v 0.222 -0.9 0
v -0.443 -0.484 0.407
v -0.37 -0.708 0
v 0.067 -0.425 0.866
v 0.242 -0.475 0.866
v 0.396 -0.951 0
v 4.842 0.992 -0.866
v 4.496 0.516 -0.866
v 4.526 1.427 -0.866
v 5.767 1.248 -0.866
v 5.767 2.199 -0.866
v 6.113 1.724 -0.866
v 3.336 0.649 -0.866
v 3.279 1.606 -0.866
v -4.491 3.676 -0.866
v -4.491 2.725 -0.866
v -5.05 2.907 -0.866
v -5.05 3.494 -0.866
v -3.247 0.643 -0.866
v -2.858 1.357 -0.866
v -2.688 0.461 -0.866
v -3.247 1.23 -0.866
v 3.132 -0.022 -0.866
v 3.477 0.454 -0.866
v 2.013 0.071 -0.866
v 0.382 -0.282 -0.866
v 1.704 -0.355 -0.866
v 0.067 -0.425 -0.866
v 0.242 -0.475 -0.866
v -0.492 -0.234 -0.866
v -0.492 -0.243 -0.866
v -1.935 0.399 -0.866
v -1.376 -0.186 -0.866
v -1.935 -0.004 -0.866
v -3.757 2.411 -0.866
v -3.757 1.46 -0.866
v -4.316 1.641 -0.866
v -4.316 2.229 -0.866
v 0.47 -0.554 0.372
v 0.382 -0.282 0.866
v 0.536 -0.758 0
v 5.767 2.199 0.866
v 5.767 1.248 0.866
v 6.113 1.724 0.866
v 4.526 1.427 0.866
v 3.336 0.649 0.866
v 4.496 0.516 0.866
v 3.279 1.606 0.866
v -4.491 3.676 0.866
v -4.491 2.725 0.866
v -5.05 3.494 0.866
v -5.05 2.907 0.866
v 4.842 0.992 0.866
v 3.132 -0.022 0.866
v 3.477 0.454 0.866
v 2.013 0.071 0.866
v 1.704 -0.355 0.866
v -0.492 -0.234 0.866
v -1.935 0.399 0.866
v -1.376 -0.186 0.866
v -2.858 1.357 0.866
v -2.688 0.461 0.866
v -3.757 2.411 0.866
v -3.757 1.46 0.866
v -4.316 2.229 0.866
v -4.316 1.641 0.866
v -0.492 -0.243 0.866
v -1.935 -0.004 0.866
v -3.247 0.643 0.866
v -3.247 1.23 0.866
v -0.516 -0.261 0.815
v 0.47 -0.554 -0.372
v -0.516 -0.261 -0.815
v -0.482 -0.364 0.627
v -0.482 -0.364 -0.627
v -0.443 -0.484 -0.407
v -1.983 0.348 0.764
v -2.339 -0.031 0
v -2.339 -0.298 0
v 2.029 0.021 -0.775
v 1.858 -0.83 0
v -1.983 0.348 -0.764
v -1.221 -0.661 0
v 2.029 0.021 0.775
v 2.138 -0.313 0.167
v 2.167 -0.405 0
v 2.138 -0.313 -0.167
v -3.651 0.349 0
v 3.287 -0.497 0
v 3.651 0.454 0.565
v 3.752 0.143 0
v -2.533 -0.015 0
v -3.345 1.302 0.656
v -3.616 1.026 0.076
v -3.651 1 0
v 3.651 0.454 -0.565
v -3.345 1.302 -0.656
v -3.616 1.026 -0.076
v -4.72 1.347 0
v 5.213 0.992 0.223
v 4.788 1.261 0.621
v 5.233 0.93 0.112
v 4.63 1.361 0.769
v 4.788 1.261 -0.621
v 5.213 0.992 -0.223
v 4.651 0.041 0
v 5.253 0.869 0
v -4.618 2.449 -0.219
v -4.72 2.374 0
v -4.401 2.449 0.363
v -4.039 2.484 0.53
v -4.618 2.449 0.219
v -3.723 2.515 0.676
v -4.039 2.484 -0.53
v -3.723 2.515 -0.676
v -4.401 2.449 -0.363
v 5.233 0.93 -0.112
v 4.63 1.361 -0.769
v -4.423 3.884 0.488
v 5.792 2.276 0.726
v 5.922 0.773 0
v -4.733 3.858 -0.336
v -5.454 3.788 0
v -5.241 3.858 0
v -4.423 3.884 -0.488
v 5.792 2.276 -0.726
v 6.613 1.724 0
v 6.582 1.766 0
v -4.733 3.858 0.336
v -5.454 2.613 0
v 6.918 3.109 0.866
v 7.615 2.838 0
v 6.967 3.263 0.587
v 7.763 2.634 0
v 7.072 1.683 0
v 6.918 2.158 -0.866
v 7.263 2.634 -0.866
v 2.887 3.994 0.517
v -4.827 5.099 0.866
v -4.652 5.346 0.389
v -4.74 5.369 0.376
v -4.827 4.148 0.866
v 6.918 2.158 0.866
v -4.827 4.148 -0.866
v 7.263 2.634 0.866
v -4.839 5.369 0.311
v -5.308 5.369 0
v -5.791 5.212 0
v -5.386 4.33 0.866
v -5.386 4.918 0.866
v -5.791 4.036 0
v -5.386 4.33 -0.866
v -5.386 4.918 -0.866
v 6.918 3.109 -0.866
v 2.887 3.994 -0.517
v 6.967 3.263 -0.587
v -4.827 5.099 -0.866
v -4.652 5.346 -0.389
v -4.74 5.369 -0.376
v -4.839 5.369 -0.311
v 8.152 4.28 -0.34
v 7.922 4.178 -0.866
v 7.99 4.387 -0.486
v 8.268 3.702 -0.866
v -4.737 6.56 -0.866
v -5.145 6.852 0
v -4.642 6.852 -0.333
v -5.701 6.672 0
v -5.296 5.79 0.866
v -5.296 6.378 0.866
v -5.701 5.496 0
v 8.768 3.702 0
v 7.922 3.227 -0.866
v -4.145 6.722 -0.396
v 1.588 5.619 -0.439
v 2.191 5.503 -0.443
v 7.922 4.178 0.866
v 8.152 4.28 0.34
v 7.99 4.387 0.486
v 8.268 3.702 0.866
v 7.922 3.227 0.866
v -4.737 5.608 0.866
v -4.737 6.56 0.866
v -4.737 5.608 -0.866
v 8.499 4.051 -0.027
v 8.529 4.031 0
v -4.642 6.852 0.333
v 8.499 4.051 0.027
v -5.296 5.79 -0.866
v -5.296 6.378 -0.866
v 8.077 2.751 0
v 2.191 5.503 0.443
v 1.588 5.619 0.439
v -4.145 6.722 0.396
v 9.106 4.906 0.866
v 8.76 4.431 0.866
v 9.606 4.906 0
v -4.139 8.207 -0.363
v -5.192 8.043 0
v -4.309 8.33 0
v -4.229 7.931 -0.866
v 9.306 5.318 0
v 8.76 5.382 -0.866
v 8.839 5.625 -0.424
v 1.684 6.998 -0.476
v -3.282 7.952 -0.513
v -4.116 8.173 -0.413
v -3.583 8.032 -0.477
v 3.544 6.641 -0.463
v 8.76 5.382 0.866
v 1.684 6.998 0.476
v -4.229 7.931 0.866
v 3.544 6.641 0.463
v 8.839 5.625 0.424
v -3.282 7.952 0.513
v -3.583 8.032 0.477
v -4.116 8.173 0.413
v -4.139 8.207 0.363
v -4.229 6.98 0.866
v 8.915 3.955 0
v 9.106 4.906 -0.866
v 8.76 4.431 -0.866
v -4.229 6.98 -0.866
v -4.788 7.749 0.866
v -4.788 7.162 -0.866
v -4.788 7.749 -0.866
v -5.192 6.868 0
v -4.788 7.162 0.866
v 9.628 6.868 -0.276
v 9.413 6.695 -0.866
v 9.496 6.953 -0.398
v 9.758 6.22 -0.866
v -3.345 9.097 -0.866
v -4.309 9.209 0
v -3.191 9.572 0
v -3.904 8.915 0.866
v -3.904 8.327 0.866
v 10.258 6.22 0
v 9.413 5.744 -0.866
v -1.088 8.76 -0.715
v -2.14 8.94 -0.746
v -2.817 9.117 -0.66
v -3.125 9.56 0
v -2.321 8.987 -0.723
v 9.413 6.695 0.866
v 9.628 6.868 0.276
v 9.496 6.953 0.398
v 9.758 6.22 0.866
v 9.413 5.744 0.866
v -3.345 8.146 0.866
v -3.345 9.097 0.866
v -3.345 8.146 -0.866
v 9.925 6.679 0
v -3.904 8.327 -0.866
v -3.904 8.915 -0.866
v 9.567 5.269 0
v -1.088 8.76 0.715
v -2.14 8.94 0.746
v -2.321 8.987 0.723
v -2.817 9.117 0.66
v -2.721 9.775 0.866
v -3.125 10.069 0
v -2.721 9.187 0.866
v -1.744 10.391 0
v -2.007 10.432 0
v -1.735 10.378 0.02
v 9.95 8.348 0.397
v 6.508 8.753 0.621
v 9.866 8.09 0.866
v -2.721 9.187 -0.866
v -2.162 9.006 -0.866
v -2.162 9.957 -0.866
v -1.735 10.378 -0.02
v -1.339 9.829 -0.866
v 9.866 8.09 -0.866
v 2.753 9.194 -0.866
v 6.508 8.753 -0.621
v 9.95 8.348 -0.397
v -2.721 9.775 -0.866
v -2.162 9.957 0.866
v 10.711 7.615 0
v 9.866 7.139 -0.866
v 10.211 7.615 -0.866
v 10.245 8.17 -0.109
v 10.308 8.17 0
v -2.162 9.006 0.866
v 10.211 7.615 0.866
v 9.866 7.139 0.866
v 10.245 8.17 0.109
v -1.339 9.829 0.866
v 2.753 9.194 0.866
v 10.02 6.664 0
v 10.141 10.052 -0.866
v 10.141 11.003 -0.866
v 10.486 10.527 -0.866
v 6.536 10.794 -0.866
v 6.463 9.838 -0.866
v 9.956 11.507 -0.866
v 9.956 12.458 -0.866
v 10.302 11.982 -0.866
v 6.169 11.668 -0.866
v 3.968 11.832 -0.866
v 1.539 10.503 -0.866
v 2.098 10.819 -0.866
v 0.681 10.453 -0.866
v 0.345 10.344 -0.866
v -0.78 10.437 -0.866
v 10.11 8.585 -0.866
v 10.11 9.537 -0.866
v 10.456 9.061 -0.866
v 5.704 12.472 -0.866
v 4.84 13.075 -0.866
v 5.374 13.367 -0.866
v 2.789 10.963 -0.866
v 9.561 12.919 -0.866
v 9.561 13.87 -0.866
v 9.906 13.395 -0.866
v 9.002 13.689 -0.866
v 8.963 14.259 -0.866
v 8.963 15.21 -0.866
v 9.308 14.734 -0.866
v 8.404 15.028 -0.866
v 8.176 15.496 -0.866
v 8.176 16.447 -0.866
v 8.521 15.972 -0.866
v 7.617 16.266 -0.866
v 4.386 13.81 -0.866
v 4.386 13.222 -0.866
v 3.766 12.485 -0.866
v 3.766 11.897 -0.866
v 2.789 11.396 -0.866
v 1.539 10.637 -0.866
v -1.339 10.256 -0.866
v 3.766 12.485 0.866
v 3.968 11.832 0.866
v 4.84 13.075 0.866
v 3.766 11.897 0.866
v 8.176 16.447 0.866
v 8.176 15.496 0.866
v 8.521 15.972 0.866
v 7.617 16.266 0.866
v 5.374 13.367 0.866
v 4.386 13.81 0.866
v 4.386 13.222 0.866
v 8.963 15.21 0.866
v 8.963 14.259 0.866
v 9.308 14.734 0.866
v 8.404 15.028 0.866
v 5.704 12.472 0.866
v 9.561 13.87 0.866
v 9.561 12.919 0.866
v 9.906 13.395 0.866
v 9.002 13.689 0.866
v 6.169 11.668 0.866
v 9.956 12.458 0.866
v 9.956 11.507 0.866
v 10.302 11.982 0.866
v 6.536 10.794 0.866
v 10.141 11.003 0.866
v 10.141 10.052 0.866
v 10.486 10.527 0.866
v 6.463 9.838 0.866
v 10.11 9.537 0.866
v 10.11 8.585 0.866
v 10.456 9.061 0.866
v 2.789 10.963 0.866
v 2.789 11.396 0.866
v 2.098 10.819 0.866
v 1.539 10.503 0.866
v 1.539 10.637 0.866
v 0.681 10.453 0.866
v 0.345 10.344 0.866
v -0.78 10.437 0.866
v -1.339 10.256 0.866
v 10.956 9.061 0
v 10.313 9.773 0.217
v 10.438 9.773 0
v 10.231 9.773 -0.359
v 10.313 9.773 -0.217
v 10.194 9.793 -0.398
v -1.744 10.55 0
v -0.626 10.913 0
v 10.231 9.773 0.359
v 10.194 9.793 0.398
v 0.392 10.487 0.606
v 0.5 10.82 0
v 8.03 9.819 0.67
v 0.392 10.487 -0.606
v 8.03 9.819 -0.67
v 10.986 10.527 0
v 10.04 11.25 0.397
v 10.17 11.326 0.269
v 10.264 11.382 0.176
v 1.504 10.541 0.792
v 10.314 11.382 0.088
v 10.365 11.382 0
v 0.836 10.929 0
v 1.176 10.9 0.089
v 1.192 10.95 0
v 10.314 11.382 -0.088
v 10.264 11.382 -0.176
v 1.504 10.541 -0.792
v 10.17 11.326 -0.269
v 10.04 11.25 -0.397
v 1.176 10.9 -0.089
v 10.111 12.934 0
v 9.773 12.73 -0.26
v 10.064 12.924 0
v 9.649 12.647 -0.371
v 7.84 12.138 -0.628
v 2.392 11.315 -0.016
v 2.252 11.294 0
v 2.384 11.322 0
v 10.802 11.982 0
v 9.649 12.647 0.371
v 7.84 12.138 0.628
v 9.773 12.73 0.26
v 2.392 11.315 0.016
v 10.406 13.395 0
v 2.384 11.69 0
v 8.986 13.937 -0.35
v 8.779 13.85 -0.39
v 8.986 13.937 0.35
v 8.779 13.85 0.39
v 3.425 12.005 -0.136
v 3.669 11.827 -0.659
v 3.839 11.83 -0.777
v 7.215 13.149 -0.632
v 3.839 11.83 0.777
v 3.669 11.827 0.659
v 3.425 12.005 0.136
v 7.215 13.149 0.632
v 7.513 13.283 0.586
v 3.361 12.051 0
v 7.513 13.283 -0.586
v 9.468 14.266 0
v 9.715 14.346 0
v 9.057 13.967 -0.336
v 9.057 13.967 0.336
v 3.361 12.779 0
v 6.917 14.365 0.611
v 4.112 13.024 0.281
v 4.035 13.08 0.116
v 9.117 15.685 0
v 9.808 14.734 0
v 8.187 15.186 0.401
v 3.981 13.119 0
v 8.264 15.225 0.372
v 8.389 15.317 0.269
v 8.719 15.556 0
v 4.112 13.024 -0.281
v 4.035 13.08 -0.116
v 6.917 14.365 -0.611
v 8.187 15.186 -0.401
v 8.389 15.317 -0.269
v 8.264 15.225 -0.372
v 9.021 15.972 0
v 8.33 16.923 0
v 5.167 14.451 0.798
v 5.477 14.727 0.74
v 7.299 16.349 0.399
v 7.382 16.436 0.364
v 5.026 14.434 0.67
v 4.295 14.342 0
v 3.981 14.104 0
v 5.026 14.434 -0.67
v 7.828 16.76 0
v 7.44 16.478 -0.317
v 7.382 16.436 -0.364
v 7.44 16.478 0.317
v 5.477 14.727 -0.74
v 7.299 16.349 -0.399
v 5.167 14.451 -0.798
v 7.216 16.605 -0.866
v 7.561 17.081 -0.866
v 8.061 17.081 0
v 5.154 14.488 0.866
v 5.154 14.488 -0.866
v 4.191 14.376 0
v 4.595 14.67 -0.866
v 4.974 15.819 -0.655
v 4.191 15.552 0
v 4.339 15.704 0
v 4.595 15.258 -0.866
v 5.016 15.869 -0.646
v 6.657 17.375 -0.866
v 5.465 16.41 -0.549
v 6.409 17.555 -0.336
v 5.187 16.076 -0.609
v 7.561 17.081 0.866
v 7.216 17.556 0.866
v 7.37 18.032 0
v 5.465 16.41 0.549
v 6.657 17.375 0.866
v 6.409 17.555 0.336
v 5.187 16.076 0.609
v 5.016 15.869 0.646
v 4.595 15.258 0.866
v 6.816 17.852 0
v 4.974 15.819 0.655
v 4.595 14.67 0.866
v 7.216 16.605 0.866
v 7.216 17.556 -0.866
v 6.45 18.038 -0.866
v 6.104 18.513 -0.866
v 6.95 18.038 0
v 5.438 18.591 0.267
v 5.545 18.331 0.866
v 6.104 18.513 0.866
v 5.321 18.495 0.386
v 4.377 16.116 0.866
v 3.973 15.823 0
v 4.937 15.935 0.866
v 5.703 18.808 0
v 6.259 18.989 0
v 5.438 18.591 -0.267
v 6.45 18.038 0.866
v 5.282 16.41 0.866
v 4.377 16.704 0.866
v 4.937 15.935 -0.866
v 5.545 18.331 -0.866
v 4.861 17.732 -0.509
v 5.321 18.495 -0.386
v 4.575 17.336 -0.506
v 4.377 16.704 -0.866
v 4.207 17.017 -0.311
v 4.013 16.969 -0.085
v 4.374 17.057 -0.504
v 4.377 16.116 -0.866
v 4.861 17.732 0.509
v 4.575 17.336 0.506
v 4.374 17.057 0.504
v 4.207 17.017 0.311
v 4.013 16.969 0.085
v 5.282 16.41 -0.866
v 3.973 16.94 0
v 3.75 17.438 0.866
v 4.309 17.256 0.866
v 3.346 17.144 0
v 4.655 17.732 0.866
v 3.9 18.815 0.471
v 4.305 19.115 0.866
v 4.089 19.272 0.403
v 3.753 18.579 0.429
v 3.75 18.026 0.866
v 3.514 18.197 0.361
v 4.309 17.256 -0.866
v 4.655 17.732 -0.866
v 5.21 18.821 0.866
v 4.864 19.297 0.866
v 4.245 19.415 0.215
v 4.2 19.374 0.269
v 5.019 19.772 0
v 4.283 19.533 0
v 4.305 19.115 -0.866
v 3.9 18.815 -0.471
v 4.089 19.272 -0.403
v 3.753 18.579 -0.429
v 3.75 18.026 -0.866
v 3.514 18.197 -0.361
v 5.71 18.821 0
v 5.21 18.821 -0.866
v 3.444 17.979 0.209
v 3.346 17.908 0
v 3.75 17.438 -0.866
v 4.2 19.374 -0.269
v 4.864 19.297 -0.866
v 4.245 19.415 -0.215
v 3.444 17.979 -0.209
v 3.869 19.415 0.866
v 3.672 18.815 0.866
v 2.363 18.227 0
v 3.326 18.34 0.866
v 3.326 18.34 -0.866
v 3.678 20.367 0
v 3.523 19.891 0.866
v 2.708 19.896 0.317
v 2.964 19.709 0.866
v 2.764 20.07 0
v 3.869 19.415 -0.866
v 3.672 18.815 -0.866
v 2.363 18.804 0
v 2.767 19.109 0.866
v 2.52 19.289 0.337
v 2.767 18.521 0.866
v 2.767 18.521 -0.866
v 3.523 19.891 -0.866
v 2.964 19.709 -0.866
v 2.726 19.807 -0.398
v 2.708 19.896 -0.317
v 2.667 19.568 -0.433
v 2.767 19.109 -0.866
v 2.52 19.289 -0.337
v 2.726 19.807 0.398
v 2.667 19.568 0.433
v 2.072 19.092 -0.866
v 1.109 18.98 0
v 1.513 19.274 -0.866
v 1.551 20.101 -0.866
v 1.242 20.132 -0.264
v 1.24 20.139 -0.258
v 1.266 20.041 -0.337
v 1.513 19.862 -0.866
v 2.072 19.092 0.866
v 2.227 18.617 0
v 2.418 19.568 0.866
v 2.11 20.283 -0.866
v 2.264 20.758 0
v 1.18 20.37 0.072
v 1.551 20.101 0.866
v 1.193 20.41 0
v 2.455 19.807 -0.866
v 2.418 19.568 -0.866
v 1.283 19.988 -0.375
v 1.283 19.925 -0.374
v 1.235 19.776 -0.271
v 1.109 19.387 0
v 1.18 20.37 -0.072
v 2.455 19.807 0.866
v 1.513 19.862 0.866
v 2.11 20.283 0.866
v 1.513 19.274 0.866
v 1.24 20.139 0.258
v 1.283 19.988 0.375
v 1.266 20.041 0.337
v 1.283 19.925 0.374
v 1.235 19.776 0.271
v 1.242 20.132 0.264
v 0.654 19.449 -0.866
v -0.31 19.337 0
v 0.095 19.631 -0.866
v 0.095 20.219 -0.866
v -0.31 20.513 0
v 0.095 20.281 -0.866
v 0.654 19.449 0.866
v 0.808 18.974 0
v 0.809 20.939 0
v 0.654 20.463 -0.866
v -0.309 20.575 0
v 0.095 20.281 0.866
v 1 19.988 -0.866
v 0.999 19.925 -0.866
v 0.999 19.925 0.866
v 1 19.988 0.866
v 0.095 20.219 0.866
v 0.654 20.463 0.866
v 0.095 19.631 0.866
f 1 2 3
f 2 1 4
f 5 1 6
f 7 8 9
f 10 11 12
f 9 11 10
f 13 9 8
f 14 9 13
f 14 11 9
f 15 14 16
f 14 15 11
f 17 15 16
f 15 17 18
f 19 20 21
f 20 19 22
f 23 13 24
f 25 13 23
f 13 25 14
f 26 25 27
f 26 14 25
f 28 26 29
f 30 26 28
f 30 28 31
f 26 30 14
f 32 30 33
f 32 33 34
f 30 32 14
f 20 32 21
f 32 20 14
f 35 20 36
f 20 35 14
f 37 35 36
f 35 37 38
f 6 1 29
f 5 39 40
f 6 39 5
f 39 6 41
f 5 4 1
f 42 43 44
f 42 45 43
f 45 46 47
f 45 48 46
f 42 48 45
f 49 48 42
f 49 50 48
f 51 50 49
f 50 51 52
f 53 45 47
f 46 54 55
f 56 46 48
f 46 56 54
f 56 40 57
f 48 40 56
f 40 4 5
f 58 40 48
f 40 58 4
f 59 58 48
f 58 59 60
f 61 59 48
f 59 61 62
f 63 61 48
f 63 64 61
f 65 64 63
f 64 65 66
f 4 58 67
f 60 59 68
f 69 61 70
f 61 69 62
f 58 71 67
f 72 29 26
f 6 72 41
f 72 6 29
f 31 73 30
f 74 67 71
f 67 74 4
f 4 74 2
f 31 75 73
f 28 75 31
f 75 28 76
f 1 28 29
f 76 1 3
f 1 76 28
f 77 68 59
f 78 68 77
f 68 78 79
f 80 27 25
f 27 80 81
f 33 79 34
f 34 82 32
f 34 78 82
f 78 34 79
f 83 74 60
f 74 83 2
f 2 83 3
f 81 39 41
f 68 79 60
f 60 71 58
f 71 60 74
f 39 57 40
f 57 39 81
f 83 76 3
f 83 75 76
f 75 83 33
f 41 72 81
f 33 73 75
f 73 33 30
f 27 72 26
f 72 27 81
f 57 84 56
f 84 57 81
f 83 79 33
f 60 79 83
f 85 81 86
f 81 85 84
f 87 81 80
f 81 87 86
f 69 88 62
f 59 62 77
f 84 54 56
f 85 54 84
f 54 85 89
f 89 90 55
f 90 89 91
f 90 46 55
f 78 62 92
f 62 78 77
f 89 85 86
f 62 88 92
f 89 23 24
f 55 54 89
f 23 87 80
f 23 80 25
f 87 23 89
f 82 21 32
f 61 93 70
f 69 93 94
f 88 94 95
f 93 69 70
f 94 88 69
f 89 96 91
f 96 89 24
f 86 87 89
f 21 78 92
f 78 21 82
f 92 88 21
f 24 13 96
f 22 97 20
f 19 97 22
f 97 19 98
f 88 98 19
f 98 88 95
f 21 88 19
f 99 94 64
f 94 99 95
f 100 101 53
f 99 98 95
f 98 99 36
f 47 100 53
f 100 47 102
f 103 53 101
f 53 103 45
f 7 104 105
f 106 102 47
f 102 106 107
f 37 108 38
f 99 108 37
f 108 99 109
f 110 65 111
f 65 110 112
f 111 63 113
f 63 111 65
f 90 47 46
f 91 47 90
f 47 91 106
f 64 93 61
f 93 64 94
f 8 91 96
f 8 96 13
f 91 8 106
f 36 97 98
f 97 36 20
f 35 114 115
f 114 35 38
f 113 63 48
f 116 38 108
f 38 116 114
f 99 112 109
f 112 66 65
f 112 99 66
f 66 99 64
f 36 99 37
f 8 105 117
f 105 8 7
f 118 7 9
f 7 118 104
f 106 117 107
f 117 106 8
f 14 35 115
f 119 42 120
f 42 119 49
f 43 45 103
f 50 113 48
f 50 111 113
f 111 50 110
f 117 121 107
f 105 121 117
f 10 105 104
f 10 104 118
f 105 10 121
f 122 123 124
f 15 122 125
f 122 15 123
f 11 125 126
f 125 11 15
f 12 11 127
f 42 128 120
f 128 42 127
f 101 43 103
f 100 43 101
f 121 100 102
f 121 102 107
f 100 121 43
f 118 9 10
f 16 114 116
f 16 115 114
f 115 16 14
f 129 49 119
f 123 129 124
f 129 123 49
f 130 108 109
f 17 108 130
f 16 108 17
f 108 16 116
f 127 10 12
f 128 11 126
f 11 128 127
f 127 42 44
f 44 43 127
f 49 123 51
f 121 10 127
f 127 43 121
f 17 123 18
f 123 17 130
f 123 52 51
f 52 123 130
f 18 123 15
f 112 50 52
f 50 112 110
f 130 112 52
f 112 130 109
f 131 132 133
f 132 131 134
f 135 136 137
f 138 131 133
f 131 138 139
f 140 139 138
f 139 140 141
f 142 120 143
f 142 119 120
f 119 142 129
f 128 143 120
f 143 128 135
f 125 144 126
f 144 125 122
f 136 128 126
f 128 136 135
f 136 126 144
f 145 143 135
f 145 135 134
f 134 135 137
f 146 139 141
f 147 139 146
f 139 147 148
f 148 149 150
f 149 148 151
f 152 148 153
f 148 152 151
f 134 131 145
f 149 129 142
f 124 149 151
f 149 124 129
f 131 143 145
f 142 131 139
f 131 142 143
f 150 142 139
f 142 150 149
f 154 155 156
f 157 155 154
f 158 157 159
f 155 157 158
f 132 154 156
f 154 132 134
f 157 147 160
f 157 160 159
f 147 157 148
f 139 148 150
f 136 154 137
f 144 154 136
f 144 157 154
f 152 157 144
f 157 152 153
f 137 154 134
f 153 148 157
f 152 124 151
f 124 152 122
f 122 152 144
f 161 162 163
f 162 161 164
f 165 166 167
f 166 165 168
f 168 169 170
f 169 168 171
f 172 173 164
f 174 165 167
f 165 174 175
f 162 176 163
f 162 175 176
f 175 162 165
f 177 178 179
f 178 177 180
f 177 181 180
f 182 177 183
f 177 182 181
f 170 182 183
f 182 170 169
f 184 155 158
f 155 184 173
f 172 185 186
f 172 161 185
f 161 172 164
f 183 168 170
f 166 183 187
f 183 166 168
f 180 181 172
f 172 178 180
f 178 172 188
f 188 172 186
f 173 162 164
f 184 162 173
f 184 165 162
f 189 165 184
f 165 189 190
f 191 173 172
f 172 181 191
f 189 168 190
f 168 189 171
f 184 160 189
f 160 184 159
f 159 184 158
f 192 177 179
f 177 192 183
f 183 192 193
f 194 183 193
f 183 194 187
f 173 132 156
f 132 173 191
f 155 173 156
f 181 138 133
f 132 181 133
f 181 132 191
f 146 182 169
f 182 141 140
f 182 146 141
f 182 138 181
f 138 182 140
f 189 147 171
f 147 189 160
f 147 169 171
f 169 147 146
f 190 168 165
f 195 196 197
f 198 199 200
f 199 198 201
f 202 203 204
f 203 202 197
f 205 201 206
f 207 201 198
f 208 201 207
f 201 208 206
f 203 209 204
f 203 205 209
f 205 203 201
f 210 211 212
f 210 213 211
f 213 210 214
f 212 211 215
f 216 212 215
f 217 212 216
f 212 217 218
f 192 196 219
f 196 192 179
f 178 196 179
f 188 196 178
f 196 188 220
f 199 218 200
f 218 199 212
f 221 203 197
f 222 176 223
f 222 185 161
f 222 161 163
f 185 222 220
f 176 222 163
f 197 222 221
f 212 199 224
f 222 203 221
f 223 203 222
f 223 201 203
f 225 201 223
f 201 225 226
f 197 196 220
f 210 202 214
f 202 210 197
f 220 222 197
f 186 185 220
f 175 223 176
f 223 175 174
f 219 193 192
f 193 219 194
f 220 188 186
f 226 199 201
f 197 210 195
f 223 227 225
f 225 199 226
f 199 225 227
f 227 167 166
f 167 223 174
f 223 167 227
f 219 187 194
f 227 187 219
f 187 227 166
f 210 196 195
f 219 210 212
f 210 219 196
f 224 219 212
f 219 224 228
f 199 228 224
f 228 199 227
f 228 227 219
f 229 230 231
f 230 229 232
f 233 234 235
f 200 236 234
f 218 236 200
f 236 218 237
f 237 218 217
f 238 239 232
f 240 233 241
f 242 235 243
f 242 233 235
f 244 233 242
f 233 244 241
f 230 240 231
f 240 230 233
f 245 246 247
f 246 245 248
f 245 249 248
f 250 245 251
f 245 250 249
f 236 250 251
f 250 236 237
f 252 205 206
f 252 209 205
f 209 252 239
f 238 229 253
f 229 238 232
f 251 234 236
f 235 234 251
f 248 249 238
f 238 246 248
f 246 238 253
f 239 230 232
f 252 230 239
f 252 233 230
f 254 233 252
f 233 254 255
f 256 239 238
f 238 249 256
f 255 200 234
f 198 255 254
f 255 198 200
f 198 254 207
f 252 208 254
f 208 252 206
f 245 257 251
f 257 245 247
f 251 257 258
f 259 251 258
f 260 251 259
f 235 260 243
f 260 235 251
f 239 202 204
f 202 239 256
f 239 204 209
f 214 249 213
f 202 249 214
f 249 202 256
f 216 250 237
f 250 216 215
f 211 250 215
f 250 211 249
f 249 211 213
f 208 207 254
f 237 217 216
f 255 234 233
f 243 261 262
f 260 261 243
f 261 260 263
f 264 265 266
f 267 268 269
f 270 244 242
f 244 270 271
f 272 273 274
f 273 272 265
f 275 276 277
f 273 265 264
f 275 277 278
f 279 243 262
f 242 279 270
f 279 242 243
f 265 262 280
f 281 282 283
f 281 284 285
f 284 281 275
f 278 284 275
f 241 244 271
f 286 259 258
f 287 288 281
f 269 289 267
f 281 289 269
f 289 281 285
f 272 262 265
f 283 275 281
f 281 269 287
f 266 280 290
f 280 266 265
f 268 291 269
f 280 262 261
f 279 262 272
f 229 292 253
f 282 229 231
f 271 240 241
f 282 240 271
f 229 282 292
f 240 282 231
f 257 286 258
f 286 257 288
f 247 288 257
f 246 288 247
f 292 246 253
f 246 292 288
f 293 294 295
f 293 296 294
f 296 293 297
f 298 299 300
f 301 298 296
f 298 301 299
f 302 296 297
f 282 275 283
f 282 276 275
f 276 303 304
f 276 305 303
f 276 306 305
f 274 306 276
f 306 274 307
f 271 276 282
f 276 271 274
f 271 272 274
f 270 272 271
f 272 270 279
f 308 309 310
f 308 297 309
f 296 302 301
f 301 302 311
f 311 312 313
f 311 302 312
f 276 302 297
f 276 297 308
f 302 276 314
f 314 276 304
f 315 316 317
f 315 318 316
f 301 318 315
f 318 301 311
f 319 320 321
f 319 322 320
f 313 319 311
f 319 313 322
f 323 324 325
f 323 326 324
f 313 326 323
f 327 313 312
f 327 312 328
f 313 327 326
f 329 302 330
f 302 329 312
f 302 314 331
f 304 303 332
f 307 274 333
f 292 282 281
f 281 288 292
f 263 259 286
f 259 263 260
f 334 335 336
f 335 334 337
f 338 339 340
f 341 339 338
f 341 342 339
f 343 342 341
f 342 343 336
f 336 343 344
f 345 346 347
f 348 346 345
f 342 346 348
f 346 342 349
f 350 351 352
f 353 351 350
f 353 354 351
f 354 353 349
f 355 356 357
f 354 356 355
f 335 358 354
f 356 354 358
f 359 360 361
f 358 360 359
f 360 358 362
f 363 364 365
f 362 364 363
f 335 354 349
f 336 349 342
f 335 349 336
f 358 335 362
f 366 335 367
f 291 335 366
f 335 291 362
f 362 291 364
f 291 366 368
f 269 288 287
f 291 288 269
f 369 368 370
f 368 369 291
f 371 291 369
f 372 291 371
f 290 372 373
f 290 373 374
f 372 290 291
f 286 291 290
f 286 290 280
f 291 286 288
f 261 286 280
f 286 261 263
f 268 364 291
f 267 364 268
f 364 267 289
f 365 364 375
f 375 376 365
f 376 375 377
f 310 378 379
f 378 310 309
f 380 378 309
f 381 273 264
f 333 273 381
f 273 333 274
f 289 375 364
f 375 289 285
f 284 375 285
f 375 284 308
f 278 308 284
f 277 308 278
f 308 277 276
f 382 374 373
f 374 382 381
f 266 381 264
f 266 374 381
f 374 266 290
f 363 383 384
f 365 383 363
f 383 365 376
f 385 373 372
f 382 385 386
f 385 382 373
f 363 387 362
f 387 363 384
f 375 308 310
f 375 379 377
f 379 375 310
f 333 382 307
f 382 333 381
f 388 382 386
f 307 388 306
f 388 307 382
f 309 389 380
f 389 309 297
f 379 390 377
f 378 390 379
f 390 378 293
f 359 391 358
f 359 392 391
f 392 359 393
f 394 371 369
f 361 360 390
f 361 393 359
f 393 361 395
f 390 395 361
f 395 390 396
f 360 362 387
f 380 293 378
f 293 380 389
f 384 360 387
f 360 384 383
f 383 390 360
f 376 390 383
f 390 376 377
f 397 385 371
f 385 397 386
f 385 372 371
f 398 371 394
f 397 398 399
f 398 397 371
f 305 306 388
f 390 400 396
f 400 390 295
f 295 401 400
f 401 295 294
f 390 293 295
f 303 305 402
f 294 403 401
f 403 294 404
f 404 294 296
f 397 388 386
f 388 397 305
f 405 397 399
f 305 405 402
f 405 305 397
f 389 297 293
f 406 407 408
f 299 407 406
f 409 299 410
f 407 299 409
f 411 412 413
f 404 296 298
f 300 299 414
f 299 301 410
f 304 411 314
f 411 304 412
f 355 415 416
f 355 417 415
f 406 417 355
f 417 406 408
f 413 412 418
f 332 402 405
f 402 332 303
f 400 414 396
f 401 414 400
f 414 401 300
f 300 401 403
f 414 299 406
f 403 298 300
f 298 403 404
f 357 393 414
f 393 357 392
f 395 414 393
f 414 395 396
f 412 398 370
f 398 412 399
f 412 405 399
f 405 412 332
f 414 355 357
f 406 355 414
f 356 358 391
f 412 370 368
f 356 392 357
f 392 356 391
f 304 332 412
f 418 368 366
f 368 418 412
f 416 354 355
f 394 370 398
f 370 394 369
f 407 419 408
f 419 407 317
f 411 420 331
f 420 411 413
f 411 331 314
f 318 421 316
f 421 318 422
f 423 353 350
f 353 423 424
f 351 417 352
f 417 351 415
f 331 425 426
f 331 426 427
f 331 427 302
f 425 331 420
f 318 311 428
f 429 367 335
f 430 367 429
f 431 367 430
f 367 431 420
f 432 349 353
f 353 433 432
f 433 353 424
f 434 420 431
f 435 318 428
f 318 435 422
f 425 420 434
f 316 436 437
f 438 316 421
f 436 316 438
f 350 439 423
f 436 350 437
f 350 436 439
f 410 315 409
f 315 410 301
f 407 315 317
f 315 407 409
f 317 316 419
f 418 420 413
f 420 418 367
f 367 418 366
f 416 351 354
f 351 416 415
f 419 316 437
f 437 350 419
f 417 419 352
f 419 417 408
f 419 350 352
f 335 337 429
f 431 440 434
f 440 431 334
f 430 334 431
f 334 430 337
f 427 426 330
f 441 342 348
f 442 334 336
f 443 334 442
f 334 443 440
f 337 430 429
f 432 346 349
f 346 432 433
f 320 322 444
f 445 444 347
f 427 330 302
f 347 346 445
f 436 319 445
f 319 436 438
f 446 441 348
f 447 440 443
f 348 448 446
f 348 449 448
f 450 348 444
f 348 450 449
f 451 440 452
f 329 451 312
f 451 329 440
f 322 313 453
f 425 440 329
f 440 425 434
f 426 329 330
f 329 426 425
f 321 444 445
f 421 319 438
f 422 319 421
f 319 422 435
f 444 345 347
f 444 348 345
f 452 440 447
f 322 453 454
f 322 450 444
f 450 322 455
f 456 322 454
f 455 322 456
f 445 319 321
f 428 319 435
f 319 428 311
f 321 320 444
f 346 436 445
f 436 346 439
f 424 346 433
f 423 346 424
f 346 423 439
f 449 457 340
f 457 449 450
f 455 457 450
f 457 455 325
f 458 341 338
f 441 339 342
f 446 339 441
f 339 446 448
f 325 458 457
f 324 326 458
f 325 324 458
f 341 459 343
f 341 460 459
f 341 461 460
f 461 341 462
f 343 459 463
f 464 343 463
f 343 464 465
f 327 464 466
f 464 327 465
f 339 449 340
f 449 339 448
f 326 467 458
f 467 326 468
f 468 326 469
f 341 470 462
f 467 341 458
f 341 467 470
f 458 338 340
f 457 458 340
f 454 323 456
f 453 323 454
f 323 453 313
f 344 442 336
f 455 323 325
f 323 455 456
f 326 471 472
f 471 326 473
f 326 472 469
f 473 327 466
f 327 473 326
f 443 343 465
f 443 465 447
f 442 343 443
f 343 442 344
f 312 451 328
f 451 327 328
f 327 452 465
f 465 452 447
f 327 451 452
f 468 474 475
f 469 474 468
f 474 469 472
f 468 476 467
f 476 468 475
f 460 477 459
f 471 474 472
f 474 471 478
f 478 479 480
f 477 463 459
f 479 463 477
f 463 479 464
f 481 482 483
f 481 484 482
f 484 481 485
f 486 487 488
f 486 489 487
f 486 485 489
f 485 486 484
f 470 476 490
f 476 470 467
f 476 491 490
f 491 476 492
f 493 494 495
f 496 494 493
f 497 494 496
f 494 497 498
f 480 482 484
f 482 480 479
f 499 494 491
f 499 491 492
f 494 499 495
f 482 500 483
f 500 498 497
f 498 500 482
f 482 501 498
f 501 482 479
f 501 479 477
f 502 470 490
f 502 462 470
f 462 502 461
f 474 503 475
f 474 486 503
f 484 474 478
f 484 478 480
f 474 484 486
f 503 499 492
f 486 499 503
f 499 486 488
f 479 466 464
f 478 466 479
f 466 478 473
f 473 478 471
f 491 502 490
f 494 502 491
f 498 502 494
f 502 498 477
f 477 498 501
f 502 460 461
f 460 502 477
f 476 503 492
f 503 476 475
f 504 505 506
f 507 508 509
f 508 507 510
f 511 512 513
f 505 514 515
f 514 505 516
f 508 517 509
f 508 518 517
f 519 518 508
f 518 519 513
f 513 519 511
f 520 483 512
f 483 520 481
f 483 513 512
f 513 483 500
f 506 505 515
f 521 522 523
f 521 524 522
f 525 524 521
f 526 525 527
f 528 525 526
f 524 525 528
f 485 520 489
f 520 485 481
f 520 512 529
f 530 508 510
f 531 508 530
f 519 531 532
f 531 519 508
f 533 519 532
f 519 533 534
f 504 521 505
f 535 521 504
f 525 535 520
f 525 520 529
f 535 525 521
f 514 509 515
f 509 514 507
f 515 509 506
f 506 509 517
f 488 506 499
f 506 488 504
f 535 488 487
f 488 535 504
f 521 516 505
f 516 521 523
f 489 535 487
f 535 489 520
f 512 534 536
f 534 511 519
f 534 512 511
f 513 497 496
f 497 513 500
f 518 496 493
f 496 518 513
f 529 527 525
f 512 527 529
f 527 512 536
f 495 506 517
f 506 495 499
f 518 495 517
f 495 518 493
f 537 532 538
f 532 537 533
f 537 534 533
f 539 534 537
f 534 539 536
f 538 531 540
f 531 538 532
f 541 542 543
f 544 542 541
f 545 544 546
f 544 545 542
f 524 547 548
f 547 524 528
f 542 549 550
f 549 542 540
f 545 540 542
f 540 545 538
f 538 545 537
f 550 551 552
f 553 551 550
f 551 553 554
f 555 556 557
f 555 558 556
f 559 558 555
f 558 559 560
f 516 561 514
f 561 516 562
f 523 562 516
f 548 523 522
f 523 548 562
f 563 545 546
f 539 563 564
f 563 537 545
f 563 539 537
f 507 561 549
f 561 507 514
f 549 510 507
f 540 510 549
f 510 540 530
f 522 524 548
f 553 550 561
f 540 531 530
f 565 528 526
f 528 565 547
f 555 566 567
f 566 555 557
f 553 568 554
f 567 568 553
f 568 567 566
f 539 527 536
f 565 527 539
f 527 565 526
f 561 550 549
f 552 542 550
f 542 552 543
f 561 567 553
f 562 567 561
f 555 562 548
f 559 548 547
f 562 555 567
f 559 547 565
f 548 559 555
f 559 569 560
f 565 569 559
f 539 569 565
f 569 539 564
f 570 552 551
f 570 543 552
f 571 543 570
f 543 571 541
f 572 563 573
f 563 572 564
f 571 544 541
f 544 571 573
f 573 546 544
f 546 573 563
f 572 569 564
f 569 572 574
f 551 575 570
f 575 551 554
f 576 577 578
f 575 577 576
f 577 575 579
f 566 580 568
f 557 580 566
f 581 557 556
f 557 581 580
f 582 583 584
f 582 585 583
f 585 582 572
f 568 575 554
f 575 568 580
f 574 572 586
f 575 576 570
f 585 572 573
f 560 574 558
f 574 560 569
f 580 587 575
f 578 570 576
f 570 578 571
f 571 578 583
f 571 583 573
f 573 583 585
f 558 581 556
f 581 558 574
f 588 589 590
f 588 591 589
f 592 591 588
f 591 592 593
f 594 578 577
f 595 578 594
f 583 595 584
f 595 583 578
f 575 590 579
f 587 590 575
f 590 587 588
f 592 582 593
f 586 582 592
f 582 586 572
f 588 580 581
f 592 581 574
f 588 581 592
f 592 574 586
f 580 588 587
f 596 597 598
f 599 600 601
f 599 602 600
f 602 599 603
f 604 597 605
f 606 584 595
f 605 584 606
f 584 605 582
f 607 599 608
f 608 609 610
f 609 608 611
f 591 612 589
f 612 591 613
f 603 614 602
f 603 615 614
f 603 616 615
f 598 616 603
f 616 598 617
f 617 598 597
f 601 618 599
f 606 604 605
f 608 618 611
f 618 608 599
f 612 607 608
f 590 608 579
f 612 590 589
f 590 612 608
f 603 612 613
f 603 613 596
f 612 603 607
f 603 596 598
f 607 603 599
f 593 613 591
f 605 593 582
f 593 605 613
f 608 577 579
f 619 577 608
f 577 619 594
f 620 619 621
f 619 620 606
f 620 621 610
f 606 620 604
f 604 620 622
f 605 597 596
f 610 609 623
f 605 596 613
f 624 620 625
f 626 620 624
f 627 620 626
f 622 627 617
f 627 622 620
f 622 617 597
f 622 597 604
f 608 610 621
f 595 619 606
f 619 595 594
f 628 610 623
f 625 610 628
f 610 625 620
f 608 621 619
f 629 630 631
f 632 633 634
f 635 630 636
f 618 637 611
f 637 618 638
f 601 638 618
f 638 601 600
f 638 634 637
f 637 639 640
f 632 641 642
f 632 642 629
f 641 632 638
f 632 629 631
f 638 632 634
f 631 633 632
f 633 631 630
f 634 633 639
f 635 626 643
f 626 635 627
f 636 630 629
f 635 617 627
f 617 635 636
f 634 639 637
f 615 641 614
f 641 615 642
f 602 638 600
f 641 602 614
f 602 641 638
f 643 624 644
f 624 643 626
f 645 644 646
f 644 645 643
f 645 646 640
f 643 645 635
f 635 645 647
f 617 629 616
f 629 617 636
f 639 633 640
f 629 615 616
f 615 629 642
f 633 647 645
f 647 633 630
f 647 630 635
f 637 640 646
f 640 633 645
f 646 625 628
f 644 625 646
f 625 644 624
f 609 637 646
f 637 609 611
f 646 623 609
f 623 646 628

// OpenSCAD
r=5;
for(i=[1:360/21.4:359]){
hull(){
 translate([0,2*r,0])translate([-sin(i)*r,-(((sign(sin(i))*cos(i)+0.99*sign(sin(i))))*(r)),0]){sphere(1,$fn10);
//text(str(i));
}
translate([0,2*r,0])translate([sin(i/2)*r*2,-cos(i/2)*r*2,0]){sphere(1,$fn10);
//text(str(i));
}

}}
